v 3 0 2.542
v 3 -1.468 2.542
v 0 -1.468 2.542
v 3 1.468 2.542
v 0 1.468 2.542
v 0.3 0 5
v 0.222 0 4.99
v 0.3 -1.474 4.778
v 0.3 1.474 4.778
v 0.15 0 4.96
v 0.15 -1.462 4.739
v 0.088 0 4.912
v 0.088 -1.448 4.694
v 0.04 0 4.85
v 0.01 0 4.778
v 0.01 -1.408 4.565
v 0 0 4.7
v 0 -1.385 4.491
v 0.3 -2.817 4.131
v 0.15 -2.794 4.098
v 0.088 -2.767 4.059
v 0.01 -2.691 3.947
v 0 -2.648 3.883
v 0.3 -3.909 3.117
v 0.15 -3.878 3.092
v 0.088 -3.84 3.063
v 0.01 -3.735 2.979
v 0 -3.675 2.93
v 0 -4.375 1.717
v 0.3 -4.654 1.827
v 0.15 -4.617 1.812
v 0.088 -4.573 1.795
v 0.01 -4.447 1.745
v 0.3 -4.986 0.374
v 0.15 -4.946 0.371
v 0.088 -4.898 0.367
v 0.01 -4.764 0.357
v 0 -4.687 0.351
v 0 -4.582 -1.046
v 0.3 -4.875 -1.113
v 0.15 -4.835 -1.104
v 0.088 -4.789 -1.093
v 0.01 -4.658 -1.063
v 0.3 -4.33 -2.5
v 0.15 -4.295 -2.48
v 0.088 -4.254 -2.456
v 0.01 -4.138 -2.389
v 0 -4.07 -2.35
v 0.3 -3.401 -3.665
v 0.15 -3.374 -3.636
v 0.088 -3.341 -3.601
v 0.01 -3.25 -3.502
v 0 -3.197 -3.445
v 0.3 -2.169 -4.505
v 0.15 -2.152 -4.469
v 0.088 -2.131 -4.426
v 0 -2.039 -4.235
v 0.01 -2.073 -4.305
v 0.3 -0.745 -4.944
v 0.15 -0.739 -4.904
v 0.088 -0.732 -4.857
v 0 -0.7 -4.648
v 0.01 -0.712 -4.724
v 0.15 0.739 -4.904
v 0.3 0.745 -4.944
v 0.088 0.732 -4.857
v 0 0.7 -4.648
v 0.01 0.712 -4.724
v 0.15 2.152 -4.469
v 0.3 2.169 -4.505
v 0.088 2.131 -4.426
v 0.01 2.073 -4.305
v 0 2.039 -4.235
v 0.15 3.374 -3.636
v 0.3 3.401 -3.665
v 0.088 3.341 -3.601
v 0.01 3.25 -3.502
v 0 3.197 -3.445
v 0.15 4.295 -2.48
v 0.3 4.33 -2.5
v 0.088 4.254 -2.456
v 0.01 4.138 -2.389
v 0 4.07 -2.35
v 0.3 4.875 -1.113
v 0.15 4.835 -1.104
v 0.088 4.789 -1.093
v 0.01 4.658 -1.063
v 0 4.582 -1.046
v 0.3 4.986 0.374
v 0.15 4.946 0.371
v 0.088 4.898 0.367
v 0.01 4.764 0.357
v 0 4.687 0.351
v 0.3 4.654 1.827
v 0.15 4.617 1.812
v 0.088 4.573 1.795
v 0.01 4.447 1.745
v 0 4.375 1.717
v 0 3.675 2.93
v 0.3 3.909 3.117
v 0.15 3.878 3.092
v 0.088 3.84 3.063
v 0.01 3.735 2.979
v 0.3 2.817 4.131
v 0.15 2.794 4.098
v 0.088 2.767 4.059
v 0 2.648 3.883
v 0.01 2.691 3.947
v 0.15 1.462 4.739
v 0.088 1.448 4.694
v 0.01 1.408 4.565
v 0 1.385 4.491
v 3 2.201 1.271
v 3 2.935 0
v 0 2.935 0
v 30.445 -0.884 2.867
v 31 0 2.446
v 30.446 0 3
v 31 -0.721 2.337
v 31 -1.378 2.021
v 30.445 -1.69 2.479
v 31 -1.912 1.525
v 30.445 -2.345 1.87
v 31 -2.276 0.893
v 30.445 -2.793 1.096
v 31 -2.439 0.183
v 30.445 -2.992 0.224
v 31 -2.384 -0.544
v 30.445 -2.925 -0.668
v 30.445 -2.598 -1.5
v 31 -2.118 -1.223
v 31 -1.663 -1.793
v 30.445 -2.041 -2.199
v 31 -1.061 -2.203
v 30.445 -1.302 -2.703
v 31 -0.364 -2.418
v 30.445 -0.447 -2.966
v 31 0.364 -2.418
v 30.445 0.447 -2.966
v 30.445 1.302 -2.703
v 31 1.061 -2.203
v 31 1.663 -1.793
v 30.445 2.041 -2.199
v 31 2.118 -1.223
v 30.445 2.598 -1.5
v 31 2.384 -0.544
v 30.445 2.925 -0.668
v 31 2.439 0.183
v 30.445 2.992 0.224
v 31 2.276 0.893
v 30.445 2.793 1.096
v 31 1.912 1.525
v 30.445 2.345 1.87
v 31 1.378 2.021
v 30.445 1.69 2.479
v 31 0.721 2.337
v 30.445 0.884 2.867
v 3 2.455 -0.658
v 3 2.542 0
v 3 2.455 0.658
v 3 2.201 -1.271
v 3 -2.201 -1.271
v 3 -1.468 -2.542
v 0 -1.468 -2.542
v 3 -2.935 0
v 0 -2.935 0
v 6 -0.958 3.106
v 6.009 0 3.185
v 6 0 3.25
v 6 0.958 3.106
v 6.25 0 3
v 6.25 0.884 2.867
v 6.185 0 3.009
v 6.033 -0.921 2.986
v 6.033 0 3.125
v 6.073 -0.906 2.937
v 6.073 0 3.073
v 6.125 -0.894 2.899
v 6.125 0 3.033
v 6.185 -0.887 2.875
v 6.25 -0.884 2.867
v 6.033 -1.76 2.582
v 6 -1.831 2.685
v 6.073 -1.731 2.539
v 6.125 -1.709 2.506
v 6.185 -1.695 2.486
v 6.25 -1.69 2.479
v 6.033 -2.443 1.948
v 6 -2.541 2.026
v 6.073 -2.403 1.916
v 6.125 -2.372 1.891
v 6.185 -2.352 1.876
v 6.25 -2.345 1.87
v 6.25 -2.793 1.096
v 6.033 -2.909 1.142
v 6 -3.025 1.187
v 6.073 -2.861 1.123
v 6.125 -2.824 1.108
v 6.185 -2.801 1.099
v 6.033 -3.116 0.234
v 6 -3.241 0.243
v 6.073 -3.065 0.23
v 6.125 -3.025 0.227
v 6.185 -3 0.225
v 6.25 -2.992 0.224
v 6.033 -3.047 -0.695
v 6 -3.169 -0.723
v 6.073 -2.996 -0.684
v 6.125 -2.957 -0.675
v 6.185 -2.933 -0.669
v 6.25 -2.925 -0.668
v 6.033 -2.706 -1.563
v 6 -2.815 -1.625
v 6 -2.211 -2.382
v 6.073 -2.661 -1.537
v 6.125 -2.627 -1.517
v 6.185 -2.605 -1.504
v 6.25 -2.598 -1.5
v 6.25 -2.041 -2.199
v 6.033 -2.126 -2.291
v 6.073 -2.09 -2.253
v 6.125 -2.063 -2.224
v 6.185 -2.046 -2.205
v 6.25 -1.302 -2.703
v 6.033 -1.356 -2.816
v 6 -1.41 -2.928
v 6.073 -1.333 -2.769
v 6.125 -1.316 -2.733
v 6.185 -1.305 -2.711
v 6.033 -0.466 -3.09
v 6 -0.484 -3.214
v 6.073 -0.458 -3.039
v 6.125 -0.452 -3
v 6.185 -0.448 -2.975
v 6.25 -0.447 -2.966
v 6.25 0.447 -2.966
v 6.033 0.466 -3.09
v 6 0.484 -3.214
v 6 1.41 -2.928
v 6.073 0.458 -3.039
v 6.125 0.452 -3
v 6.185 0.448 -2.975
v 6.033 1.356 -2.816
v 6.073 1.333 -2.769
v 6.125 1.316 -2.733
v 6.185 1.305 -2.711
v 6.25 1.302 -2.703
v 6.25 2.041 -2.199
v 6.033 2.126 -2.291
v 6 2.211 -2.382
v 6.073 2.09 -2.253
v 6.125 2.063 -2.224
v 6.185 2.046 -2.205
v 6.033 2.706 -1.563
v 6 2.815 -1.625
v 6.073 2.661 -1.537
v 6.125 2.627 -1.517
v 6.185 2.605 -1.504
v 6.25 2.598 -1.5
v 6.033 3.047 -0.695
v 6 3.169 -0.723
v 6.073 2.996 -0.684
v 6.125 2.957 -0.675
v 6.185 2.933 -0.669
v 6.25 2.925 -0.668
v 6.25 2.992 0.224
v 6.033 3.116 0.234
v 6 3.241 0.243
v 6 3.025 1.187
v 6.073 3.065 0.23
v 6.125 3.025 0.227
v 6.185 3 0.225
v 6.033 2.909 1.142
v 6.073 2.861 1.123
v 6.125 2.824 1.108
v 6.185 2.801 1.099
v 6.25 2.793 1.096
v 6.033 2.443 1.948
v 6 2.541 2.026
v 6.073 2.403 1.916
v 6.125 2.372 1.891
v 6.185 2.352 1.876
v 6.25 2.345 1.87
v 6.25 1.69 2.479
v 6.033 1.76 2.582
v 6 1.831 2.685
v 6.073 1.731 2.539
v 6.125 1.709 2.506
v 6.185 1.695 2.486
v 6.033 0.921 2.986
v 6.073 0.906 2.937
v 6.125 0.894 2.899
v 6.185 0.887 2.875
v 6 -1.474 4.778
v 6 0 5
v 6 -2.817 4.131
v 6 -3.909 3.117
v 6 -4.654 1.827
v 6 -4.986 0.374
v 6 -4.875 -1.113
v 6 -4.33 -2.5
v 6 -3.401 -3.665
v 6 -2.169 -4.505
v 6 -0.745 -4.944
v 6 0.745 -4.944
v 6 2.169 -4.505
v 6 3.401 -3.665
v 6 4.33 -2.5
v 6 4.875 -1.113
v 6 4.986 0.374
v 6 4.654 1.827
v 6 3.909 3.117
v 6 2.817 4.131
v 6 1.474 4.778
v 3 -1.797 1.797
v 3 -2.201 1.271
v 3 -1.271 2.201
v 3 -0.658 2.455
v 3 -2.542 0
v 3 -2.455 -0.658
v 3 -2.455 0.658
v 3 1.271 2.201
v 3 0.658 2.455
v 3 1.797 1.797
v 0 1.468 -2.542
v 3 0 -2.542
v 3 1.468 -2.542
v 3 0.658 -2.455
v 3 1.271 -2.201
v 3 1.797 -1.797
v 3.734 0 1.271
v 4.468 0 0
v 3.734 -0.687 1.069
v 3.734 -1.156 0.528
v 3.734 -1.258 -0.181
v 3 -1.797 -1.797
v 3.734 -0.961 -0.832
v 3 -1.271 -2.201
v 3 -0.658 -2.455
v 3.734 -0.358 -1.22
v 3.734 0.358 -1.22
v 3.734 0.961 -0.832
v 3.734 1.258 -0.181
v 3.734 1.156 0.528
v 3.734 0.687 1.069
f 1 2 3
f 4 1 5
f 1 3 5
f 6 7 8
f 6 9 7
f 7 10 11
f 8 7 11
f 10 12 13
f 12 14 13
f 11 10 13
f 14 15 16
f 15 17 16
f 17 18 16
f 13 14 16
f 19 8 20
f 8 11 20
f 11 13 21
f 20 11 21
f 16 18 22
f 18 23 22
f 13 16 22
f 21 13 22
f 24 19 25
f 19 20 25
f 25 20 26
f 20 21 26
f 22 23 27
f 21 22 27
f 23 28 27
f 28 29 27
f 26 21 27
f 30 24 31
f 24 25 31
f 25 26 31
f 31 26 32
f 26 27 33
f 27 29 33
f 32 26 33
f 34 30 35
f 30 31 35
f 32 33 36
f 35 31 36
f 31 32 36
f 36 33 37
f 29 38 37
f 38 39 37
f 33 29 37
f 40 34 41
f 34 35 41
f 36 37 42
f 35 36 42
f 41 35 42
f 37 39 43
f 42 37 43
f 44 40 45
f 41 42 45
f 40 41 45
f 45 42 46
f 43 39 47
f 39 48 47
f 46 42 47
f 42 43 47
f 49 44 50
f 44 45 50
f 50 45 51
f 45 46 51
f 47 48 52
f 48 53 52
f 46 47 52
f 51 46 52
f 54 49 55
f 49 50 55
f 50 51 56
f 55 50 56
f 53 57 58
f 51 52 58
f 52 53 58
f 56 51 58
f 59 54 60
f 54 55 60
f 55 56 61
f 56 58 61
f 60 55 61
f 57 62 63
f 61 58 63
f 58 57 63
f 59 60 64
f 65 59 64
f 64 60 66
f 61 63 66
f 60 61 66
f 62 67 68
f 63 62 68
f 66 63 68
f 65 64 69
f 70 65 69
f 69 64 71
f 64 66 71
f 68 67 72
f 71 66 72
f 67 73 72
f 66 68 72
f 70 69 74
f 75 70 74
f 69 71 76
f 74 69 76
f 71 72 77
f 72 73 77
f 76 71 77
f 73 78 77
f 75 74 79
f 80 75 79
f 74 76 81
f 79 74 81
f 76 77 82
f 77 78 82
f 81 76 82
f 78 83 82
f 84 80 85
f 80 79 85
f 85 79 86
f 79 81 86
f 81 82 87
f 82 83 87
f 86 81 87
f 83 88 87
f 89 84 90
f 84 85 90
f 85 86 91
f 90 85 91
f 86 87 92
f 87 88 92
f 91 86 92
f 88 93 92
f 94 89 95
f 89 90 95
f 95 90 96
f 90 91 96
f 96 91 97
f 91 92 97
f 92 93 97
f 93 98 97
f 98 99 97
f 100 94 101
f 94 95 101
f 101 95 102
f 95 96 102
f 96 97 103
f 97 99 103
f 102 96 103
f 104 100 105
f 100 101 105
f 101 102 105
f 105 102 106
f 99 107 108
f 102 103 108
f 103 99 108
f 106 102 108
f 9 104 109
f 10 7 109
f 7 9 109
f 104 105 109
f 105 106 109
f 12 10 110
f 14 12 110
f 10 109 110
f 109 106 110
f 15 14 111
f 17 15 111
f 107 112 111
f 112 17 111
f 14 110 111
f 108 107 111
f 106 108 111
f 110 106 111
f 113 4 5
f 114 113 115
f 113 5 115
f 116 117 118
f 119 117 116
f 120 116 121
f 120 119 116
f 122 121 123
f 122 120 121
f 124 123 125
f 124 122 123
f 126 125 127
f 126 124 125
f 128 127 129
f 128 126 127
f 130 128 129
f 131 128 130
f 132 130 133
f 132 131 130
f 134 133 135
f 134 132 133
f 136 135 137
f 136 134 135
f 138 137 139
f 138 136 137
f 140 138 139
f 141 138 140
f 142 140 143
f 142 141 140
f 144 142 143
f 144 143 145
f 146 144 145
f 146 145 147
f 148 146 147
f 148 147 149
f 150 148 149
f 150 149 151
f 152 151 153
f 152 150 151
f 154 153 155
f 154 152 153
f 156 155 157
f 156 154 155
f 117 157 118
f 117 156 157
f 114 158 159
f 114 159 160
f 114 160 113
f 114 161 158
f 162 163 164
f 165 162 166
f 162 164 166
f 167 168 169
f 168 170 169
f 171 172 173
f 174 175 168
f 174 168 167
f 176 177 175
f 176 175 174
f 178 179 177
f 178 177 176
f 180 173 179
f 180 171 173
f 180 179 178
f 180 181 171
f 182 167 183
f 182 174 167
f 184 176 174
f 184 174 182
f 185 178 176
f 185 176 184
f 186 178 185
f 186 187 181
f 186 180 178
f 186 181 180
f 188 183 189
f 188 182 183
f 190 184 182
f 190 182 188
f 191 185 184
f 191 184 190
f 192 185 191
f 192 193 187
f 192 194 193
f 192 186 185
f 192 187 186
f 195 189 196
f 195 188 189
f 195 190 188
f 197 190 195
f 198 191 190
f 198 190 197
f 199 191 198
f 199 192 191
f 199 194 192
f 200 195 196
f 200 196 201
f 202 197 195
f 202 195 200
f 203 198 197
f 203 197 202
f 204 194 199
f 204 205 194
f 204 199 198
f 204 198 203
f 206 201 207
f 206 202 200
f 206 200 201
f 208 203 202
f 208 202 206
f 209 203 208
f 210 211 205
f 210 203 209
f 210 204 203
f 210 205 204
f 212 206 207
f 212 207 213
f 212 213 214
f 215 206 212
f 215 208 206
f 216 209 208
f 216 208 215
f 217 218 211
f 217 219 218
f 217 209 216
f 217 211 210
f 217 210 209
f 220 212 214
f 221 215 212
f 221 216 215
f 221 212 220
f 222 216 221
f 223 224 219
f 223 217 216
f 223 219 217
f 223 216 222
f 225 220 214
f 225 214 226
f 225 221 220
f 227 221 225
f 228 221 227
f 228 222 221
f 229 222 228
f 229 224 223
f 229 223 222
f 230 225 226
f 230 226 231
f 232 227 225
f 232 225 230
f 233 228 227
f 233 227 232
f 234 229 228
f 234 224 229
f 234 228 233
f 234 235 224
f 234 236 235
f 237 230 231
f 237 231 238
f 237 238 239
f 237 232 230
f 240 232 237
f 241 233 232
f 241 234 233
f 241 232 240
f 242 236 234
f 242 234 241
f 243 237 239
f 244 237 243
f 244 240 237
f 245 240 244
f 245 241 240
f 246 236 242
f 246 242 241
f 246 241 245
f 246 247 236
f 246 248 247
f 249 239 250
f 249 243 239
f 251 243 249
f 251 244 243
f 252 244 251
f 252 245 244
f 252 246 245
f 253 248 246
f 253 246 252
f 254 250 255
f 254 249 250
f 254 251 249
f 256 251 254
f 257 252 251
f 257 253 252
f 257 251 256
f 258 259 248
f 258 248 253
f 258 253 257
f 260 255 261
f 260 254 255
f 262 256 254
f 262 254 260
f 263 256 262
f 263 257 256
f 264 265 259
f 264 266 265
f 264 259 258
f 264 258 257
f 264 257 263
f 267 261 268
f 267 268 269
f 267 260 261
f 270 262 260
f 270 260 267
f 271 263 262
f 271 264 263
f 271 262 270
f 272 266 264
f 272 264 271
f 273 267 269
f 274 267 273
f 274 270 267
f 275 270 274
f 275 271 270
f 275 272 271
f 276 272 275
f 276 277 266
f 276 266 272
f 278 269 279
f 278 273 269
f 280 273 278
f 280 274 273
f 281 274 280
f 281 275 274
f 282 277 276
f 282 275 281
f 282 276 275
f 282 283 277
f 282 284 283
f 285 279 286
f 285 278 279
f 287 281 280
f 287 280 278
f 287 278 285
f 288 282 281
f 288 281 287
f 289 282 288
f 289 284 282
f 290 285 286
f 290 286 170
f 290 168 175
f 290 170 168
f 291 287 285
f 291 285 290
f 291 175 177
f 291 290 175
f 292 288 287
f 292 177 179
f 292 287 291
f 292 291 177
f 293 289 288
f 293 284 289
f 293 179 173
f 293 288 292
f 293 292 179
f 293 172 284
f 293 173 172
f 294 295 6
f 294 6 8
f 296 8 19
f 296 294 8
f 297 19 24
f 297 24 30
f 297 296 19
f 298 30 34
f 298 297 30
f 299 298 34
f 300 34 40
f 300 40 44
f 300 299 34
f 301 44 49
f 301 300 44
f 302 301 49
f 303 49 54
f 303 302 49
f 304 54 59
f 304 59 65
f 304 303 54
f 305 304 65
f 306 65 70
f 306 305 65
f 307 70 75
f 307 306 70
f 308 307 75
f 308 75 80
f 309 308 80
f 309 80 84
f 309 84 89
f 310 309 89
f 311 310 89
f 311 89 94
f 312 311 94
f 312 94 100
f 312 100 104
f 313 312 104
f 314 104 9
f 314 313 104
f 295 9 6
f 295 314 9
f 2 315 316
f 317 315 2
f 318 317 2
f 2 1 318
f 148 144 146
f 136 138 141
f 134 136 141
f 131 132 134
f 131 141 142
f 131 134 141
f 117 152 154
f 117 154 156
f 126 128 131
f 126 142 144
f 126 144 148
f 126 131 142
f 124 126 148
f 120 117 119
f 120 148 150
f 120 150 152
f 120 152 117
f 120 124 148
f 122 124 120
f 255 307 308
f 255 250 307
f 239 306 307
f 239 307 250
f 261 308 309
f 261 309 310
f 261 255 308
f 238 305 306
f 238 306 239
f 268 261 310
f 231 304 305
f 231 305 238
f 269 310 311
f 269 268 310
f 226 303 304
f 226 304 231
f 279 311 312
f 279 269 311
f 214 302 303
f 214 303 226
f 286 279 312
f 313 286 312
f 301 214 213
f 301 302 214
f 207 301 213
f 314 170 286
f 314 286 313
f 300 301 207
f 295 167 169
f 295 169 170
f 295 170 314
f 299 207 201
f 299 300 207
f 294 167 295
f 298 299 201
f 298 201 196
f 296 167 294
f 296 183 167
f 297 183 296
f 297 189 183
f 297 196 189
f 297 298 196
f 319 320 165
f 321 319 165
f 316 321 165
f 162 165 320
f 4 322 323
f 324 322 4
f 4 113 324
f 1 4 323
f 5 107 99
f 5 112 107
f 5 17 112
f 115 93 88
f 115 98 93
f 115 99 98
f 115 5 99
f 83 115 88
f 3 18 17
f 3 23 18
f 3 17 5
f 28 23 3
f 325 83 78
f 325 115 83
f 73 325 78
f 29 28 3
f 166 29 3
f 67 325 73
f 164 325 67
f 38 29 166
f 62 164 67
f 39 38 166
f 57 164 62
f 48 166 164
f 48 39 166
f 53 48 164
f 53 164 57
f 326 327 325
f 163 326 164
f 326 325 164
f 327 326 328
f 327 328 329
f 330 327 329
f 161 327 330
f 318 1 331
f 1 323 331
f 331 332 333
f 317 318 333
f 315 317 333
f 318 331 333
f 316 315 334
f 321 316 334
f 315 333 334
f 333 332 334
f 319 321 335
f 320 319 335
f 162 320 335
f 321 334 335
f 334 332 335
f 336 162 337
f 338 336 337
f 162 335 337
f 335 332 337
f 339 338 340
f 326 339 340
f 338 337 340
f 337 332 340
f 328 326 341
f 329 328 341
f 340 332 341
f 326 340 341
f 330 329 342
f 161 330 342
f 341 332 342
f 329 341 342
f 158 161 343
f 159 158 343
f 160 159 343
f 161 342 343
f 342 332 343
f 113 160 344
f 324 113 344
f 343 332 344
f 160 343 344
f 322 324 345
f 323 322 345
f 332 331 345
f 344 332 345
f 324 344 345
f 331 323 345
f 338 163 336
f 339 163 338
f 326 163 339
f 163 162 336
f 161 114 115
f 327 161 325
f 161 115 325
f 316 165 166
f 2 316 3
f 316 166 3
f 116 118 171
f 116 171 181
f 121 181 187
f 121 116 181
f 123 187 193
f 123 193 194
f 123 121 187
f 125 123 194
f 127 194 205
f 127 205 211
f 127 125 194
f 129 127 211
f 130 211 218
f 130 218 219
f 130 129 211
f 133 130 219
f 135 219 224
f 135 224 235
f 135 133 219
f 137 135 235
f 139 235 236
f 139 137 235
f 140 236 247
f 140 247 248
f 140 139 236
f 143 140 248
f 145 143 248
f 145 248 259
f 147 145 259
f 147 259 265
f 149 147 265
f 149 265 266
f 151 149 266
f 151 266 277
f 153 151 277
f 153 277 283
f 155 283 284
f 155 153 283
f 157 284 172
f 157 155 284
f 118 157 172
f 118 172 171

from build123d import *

# Parameters (mm, degrees)
FILLET1_R   = 0.25
FILLET2_R   = 0.3
HEX_2_DEPTH = 3


with BuildPart() as part:
    # BodySke → Base-Revolve (revolve)
    with BuildSketch(Plane.XY, mode=Mode.PRIVATE) as base_revolve_sk:
        Polygon((0, 0), (0, 5), (6, 5), (6, 3), (30.4455, 3), (31, 2.4455), (31, 0), align=None)
    revolve(base_revolve_sk.sketch.rotate(Axis((-31.75, 0, 0), (1, 0, 0)), 90), axis=Axis((-31.75, 0, 0), (1, 0, 0)))  # turned: the seam where the file's is

    # Fillet1
    fillet1_edges = [part.edges().sort_by_distance(p)[0] for p in [
        (6, 0, -3),
    ]]
    fillet(fillet1_edges, radius=FILLET1_R)

    # Fillet2
    fillet2_edges = [part.edges().sort_by_distance(p)[0] for p in [
        (0, 0, -5),
    ]]
    fillet(fillet2_edges, radius=FILLET2_R)

    # Sketch2 → Hex-PreBroach (revolve, cut)
    with BuildSketch(Plane.XY, mode=Mode.PRIVATE) as hex_prebroach_sk:
        Polygon((0, 2.542), (3, 2.542), (4.467624384, 0), (0, 0), align=None)
    revolve(hex_prebroach_sk.sketch.rotate(Axis((0, 0, 0), (1, 0, 0)), 90), axis=Axis((0, 0, 0), (1, 0, 0)), mode=Mode.SUBTRACT)  # turned: the seam where the file's is

    # Sketch3 → Hex 2 (cut)
    with BuildSketch(Plane(origin=(0, 0, 0), x_dir=(0, 0.5, 0.866025404), z_dir=(-1, 0, 0))):
        Polygon((1.467624384, 2.542), (-1.467624384, 2.542), (-2.935248769, 0), (-1.467624384, -2.542), (1.467624384, -2.542), (2.935248769, 0), align=None)
    extrude(amount=-HEX_2_DEPTH, mode=Mode.SUBTRACT)


solid = part.part
